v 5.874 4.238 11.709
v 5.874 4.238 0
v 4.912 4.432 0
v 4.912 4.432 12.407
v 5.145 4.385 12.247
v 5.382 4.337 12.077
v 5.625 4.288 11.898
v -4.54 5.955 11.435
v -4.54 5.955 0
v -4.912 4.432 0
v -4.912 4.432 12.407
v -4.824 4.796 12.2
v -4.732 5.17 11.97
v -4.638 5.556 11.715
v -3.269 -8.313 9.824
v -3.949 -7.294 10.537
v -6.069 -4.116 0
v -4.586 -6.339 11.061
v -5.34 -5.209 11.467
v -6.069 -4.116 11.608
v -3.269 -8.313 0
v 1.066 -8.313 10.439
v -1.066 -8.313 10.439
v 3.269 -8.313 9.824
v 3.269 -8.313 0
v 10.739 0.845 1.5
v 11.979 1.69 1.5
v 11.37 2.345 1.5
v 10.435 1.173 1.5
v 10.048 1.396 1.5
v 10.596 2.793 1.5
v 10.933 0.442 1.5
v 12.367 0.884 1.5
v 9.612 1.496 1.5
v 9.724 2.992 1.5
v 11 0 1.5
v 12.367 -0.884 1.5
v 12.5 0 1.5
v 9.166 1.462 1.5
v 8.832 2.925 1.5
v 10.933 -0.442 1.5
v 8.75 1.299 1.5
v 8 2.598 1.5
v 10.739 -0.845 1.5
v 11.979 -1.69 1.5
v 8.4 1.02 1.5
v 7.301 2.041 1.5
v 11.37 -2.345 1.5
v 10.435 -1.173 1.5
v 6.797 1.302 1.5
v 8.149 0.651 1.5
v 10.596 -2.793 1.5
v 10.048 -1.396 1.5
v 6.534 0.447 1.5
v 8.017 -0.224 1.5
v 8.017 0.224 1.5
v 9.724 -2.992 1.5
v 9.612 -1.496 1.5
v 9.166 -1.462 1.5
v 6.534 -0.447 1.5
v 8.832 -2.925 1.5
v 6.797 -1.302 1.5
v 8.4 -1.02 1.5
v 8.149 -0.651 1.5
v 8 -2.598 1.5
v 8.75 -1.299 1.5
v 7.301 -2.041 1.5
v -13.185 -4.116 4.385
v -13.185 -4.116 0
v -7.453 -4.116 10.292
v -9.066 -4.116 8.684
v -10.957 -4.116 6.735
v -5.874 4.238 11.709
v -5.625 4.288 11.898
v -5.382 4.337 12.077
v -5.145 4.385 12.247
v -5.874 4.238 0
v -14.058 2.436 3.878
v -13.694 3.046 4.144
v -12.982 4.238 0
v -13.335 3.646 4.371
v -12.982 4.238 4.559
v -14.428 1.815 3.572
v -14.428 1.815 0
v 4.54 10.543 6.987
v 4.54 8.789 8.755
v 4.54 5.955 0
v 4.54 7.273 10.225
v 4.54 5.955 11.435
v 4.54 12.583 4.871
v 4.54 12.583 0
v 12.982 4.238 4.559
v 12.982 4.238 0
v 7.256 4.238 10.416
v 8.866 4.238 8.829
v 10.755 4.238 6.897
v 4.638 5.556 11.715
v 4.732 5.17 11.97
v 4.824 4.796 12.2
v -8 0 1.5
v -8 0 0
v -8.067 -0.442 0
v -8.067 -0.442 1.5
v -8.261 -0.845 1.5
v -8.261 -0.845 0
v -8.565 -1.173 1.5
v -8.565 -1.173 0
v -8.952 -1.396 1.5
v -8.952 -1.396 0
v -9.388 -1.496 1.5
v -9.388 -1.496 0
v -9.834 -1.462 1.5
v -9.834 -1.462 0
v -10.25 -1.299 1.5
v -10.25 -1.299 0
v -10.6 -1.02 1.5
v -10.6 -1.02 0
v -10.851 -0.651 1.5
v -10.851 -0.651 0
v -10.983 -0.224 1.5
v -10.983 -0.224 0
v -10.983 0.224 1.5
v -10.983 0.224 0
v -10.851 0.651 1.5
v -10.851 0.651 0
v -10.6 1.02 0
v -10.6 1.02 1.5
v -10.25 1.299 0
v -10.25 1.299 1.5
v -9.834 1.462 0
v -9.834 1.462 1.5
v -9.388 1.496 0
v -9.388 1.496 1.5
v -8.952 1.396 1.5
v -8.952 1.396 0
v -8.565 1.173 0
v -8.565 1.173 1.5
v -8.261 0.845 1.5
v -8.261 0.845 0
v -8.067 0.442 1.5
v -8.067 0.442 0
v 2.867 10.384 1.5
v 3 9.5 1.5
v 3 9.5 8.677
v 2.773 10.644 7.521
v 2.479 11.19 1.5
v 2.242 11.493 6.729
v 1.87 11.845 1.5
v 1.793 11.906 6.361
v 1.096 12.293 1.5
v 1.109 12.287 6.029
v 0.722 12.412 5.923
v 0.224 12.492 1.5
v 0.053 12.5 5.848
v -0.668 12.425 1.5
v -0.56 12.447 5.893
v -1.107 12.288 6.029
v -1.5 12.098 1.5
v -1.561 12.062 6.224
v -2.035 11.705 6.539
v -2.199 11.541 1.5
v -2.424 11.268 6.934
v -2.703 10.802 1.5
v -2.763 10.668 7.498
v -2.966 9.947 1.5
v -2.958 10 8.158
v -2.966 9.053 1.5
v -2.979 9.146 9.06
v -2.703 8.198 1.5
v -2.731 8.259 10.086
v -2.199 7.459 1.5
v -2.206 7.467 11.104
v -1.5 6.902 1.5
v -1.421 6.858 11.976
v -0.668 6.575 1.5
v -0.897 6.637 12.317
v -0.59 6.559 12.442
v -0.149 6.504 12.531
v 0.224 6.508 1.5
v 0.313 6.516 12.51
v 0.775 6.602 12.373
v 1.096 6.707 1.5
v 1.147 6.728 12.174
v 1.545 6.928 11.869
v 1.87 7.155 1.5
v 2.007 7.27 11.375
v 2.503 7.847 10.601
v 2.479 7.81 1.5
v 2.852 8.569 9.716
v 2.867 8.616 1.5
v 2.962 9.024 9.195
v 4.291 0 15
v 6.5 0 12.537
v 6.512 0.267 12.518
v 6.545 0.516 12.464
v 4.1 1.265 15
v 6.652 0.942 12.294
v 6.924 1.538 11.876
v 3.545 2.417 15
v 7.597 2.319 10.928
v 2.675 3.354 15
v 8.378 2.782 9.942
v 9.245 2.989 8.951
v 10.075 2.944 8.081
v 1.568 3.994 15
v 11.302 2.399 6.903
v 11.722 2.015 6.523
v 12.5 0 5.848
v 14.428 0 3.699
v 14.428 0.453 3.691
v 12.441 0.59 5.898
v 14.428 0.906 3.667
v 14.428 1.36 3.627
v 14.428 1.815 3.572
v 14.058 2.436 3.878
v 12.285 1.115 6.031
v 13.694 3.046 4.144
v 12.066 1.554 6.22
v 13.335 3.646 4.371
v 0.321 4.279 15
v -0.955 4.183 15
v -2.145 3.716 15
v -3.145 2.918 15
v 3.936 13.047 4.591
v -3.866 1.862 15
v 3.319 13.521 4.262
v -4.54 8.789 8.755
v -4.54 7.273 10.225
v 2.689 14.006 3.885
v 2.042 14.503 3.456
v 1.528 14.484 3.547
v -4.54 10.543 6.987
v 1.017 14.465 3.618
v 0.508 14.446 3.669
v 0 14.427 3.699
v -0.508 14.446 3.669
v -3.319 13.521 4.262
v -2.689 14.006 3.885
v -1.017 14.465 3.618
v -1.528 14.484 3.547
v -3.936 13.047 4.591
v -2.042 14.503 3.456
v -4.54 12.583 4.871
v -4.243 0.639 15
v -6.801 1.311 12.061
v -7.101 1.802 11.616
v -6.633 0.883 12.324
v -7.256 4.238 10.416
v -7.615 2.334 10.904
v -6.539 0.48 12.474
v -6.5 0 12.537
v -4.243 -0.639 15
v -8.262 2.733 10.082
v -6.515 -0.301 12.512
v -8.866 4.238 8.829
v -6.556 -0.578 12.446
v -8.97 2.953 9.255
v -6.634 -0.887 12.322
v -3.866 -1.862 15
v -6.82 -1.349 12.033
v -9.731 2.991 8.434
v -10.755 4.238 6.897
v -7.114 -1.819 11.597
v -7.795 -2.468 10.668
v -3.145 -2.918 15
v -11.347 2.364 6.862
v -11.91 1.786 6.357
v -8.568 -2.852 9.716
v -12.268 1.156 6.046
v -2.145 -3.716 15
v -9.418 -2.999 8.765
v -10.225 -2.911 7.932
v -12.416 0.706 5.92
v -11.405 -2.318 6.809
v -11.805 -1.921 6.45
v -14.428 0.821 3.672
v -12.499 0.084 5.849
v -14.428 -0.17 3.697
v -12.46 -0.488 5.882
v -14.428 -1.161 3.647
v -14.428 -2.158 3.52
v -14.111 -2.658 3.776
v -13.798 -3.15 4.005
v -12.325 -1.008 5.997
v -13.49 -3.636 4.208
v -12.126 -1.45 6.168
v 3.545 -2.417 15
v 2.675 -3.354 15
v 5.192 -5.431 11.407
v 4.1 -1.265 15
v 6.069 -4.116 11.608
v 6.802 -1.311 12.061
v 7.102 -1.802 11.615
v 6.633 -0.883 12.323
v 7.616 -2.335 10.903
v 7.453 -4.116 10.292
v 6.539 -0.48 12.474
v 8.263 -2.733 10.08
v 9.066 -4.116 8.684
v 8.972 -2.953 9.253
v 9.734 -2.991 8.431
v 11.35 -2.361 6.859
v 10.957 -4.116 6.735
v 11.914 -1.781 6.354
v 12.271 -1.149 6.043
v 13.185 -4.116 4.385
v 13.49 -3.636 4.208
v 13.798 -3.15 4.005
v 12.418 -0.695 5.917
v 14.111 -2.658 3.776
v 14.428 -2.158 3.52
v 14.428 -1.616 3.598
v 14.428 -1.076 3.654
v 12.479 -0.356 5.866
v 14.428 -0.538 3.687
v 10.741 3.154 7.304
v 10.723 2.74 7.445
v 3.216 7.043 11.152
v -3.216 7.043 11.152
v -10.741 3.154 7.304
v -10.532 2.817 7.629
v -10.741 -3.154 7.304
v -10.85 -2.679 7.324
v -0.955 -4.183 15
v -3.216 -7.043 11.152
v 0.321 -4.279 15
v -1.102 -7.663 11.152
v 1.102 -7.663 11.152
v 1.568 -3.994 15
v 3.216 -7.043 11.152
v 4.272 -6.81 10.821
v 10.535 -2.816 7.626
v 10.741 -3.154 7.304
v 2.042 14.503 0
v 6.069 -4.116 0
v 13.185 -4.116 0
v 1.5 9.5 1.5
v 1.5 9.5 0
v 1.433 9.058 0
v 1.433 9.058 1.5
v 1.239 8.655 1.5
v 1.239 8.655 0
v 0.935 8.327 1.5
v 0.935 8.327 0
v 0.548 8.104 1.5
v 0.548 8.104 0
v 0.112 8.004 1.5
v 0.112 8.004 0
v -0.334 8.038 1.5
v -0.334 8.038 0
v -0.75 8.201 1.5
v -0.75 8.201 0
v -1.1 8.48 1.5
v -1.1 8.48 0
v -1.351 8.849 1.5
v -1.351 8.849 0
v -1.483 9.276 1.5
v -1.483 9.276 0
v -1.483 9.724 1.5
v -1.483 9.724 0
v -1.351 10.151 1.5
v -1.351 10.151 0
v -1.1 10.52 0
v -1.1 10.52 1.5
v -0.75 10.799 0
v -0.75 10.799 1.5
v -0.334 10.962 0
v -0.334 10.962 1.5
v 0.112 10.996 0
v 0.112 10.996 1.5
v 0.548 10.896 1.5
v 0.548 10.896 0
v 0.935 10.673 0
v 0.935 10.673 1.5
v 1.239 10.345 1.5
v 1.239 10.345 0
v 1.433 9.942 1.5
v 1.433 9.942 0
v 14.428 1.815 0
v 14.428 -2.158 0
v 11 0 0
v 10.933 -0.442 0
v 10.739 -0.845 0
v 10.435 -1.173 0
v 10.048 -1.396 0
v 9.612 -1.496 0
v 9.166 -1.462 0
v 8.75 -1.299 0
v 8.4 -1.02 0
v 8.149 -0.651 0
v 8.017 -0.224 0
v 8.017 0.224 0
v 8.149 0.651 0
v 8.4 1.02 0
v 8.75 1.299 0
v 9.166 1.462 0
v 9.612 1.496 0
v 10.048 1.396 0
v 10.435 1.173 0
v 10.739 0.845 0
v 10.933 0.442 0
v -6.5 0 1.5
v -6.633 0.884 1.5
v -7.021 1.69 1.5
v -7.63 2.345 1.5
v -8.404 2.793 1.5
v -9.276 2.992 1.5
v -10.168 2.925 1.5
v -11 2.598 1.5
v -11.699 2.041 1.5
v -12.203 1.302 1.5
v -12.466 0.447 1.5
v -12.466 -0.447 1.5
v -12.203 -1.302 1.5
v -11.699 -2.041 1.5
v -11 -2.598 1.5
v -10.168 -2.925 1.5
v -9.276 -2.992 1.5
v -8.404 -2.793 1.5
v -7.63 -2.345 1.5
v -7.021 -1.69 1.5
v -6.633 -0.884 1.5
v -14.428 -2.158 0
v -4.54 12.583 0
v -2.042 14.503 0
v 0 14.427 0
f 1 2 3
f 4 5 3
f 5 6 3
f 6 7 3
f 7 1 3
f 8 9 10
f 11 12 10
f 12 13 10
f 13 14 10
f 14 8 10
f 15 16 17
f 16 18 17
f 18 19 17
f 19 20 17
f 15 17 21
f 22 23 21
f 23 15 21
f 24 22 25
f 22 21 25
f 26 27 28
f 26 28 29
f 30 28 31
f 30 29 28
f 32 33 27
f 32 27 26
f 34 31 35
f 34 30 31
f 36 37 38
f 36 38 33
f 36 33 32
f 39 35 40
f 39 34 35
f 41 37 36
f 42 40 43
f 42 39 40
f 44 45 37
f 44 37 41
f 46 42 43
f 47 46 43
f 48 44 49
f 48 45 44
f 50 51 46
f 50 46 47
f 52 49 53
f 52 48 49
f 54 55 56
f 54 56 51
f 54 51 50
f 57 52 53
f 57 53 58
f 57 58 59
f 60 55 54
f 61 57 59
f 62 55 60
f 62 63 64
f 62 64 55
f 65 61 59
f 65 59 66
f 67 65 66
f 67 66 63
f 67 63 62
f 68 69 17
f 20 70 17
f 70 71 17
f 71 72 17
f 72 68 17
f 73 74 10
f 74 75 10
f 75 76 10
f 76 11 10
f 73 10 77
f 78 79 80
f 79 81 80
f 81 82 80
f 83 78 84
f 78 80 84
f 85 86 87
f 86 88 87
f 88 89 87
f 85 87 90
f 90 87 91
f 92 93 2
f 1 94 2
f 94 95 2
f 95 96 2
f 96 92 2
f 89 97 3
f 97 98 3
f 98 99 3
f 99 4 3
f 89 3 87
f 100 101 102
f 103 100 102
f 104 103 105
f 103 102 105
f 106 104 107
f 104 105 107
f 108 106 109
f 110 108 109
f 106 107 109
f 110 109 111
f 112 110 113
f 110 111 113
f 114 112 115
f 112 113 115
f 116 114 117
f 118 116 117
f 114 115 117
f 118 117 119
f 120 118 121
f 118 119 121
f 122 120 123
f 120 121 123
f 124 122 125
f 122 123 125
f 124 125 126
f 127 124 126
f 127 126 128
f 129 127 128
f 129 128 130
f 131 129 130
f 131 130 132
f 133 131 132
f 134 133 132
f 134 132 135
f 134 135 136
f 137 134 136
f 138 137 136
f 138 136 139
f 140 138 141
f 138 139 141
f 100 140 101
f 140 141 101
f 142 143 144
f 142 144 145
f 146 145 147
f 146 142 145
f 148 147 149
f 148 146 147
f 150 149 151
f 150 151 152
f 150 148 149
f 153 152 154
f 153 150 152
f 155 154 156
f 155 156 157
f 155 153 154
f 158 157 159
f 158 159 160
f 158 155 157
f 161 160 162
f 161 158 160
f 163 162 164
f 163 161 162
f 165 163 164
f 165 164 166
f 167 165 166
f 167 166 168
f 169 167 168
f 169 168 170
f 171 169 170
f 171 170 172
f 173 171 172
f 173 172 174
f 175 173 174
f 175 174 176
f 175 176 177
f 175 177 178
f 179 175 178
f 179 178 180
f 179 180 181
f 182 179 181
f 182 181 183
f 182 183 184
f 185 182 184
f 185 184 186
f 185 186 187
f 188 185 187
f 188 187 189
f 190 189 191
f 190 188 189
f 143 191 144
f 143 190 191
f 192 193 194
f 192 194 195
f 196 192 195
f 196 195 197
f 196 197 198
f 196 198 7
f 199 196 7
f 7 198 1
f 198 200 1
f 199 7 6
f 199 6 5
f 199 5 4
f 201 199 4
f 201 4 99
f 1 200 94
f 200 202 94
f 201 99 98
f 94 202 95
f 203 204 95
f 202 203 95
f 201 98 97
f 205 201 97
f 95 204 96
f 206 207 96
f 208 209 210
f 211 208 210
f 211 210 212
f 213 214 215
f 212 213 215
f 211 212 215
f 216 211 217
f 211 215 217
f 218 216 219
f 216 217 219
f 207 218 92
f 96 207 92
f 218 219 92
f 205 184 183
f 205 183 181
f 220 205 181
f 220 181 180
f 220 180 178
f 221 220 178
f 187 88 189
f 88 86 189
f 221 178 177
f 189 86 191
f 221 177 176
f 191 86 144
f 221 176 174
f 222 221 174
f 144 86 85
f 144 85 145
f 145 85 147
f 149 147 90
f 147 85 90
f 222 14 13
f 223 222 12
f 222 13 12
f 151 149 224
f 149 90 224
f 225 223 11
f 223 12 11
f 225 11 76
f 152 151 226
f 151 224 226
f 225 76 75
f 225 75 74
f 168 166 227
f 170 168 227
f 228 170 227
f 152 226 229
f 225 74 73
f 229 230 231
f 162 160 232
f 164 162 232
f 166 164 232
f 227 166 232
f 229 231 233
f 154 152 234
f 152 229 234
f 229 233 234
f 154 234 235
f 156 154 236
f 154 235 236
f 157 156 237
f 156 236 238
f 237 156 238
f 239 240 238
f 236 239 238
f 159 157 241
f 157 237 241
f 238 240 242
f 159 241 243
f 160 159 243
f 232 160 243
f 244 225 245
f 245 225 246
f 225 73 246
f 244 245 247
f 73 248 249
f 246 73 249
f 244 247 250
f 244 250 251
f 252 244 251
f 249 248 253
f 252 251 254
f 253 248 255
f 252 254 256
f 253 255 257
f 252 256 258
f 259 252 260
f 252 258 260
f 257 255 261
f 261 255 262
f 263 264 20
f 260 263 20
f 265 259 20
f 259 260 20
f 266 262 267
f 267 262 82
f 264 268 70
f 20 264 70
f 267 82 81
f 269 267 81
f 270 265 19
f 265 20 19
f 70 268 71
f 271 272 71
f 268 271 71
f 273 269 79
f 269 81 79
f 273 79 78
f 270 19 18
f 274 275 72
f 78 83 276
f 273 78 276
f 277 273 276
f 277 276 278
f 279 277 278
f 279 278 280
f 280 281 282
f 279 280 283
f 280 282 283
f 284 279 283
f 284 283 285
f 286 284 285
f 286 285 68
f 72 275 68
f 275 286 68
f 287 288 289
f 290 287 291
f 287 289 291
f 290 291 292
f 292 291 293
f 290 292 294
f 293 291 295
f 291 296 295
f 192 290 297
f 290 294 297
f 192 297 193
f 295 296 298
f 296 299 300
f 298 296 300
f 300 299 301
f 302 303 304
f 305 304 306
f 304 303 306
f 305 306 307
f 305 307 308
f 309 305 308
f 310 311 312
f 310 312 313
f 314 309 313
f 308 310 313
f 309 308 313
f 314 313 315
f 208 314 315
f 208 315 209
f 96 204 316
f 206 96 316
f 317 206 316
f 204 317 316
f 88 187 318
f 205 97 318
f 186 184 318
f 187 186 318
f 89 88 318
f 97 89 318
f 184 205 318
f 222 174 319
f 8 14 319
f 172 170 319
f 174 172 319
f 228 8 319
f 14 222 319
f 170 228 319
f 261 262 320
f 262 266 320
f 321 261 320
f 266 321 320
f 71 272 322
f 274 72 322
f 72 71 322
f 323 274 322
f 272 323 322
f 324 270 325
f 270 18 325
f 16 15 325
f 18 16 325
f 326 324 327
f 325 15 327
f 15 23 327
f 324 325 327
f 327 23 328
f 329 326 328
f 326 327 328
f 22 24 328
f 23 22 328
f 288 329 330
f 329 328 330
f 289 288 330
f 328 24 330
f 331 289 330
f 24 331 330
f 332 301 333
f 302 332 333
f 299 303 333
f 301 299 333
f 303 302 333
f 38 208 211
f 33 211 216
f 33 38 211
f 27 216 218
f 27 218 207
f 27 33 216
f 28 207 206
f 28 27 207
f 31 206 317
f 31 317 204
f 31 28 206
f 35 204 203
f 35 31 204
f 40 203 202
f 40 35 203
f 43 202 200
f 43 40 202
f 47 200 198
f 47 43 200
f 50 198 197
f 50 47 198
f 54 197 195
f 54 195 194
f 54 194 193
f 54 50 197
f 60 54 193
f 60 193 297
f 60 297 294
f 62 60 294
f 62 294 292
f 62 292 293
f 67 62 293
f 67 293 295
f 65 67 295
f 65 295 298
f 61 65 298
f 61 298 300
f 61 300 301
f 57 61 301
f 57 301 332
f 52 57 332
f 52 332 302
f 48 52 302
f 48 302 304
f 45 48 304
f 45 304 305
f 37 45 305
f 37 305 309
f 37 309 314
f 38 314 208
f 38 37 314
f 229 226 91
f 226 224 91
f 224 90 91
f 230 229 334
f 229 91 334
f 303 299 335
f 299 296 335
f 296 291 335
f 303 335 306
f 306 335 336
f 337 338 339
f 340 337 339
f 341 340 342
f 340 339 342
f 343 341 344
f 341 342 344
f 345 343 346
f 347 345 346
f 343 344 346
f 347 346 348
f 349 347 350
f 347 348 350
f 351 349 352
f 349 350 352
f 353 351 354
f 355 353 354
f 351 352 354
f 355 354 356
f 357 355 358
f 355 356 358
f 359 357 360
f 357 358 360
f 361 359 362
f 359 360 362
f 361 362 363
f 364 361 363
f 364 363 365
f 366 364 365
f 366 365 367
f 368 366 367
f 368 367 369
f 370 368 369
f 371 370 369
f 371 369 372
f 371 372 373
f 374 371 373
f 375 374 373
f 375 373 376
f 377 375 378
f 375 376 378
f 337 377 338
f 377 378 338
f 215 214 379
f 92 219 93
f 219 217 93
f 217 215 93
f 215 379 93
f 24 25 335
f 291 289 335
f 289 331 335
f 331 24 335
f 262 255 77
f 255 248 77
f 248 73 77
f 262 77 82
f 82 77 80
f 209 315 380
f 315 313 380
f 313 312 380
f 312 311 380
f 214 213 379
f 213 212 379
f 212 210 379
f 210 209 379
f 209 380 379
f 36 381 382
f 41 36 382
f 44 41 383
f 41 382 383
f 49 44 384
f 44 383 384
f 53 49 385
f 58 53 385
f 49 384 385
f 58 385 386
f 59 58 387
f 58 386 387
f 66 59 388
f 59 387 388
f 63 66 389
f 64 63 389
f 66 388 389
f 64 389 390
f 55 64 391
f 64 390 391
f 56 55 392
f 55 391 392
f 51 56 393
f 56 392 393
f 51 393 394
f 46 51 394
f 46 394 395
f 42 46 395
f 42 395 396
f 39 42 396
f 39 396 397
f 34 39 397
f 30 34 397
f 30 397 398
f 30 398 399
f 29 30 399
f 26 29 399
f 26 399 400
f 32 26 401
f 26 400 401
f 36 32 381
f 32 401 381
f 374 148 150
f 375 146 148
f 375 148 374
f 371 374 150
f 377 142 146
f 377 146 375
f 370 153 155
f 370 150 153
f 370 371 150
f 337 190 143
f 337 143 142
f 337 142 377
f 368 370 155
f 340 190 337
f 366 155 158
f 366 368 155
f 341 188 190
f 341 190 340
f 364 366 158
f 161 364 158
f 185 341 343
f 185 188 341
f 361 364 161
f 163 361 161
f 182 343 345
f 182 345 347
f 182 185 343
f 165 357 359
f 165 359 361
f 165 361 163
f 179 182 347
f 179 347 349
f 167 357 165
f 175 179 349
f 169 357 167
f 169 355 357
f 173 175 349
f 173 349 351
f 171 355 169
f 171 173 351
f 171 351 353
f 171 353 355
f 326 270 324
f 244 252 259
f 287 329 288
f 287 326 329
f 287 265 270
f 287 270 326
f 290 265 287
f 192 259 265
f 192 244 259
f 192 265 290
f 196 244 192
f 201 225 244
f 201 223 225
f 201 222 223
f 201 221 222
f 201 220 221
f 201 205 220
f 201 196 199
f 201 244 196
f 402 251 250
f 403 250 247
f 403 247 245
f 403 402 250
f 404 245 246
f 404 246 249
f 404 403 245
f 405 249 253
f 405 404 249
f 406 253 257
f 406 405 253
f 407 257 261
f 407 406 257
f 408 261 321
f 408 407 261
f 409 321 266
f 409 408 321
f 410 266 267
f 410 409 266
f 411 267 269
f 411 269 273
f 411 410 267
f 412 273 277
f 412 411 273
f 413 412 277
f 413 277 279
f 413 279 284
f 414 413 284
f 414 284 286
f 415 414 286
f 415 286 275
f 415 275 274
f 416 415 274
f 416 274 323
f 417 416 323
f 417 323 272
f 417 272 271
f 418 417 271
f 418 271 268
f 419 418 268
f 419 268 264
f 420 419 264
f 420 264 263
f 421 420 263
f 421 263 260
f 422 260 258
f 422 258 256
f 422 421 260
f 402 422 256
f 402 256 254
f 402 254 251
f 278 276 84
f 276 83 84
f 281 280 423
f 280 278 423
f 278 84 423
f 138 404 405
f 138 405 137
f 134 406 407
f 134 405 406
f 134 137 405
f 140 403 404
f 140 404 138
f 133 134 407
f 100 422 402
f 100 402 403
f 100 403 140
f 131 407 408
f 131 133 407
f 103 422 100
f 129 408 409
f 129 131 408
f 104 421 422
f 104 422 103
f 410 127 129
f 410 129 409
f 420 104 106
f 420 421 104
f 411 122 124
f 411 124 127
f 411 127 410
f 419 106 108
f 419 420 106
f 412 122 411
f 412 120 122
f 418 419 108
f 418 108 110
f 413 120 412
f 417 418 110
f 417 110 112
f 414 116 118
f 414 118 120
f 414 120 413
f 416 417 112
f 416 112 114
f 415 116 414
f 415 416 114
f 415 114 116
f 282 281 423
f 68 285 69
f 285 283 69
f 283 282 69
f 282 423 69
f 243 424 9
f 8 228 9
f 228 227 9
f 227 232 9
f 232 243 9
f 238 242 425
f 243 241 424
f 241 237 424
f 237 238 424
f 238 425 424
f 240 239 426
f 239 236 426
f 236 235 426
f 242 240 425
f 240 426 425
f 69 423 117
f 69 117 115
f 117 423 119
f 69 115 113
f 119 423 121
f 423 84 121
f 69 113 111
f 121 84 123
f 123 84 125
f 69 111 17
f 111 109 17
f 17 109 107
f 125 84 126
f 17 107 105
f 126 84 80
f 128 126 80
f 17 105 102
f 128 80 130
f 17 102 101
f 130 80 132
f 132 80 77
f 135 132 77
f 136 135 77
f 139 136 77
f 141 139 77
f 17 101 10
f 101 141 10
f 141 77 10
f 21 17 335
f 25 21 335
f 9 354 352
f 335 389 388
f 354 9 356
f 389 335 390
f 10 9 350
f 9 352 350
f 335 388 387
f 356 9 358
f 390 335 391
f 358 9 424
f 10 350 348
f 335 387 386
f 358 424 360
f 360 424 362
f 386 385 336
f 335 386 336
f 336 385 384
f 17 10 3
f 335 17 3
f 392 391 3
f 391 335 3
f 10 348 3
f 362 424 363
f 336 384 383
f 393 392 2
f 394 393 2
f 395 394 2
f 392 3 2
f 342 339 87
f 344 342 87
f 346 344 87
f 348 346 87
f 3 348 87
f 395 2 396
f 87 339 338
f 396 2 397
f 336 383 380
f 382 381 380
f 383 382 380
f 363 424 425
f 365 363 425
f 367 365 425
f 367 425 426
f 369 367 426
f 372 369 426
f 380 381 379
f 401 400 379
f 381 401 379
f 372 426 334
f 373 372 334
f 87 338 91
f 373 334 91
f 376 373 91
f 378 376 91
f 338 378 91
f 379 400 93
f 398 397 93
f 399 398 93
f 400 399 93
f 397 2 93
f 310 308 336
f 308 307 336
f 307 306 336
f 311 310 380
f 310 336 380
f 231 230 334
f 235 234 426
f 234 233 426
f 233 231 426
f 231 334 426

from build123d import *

# Parameters (mm, degrees)
SKETCH_R     = 3
PAD_DEPTH    = 15
SKETCH002_R  = 1.5
PAD001_DEPTH = 1.5


with BuildPart() as part:
    # Sketch → Pad (new body)
    with BuildSketch(Plane.XY):
        Polygon((0, 14.427438), (-2.041881, 14.502734), (-4.540238, 12.582665), (-4.540238, 8.140154), (-4.540238, 5.954917), (-4.912402, 4.43243), (-5.873682, 4.237903), (-12.981692, 4.237903), (-14.428203, 1.815223), (-14.428203, 0), (-14.428203, -2.157977), (-13.184835, -4.115694), (-6.069288, -4.115694), (-3.269161, -8.313478), (0, -8.313478), (3.269161, -8.313478), (6.069288, -4.115694), (13.184835, -4.115694), (14.428203, -2.157977), (14.428203, 0), (14.428203, 1.815223), (12.981692, 4.237903), (5.873682, 4.237903), (4.912402, 4.43243), (4.540238, 5.954917), (4.540238, 8.140154), (4.540238, 12.582665), (2.041881, 14.502734), align=None)
        with Locations((0, 9.5)):
            Circle(SKETCH_R, mode=Mode.SUBTRACT)
        with Locations((-9.5, 0)):
            Circle(SKETCH_R, mode=Mode.SUBTRACT)
        with Locations((9.5, 0)):
            Circle(SKETCH_R, mode=Mode.SUBTRACT)
    extrude(amount=PAD_DEPTH)

    # Sketch001 → Groove (revolve, cut)
    with BuildSketch(Plane.XZ):
        Polygon((3.000144, 16.438543), (15.461766, 2.546283), (18.059507, 16.438543), align=None)
    revolve(axis=Axis((0, 0, 0), (0, 0, 1)), mode=Mode.SUBTRACT)

    # Sketch002 (on Face2 of Groove) → Pad001 (join)
    with BuildSketch(Plane(origin=(0, 0, 0), x_dir=(1, 0, 0), z_dir=(0, 0, -1))):
        Polygon((-12.307145, 3.302316), (11.637245, 3.302316), (13.331424, 0.817521), (13.067885, -2.119055), (11.185462, -3.474398), (3.392242, -3.474398), (3.655782, -9.272253), (2.940462, -12.66061), (0.342722, -13.37593), (-2.895042, -12.773556), (-3.873901, -9.159308), (-3.459768, -4.528554), (-5.455134, -2.984969), (-11.70477, -3.737936), (-13.737784, -1.366087), align=None)
        with Locations((-9.5, 0)):
            Circle(SKETCH002_R, mode=Mode.SUBTRACT)
        with Locations((9.5, 0)):
            Circle(SKETCH002_R, mode=Mode.SUBTRACT)
        with Locations((0, -9.5)):
            Circle(SKETCH002_R, mode=Mode.SUBTRACT)
    extrude(amount=-PAD001_DEPTH)


solid = part.part
